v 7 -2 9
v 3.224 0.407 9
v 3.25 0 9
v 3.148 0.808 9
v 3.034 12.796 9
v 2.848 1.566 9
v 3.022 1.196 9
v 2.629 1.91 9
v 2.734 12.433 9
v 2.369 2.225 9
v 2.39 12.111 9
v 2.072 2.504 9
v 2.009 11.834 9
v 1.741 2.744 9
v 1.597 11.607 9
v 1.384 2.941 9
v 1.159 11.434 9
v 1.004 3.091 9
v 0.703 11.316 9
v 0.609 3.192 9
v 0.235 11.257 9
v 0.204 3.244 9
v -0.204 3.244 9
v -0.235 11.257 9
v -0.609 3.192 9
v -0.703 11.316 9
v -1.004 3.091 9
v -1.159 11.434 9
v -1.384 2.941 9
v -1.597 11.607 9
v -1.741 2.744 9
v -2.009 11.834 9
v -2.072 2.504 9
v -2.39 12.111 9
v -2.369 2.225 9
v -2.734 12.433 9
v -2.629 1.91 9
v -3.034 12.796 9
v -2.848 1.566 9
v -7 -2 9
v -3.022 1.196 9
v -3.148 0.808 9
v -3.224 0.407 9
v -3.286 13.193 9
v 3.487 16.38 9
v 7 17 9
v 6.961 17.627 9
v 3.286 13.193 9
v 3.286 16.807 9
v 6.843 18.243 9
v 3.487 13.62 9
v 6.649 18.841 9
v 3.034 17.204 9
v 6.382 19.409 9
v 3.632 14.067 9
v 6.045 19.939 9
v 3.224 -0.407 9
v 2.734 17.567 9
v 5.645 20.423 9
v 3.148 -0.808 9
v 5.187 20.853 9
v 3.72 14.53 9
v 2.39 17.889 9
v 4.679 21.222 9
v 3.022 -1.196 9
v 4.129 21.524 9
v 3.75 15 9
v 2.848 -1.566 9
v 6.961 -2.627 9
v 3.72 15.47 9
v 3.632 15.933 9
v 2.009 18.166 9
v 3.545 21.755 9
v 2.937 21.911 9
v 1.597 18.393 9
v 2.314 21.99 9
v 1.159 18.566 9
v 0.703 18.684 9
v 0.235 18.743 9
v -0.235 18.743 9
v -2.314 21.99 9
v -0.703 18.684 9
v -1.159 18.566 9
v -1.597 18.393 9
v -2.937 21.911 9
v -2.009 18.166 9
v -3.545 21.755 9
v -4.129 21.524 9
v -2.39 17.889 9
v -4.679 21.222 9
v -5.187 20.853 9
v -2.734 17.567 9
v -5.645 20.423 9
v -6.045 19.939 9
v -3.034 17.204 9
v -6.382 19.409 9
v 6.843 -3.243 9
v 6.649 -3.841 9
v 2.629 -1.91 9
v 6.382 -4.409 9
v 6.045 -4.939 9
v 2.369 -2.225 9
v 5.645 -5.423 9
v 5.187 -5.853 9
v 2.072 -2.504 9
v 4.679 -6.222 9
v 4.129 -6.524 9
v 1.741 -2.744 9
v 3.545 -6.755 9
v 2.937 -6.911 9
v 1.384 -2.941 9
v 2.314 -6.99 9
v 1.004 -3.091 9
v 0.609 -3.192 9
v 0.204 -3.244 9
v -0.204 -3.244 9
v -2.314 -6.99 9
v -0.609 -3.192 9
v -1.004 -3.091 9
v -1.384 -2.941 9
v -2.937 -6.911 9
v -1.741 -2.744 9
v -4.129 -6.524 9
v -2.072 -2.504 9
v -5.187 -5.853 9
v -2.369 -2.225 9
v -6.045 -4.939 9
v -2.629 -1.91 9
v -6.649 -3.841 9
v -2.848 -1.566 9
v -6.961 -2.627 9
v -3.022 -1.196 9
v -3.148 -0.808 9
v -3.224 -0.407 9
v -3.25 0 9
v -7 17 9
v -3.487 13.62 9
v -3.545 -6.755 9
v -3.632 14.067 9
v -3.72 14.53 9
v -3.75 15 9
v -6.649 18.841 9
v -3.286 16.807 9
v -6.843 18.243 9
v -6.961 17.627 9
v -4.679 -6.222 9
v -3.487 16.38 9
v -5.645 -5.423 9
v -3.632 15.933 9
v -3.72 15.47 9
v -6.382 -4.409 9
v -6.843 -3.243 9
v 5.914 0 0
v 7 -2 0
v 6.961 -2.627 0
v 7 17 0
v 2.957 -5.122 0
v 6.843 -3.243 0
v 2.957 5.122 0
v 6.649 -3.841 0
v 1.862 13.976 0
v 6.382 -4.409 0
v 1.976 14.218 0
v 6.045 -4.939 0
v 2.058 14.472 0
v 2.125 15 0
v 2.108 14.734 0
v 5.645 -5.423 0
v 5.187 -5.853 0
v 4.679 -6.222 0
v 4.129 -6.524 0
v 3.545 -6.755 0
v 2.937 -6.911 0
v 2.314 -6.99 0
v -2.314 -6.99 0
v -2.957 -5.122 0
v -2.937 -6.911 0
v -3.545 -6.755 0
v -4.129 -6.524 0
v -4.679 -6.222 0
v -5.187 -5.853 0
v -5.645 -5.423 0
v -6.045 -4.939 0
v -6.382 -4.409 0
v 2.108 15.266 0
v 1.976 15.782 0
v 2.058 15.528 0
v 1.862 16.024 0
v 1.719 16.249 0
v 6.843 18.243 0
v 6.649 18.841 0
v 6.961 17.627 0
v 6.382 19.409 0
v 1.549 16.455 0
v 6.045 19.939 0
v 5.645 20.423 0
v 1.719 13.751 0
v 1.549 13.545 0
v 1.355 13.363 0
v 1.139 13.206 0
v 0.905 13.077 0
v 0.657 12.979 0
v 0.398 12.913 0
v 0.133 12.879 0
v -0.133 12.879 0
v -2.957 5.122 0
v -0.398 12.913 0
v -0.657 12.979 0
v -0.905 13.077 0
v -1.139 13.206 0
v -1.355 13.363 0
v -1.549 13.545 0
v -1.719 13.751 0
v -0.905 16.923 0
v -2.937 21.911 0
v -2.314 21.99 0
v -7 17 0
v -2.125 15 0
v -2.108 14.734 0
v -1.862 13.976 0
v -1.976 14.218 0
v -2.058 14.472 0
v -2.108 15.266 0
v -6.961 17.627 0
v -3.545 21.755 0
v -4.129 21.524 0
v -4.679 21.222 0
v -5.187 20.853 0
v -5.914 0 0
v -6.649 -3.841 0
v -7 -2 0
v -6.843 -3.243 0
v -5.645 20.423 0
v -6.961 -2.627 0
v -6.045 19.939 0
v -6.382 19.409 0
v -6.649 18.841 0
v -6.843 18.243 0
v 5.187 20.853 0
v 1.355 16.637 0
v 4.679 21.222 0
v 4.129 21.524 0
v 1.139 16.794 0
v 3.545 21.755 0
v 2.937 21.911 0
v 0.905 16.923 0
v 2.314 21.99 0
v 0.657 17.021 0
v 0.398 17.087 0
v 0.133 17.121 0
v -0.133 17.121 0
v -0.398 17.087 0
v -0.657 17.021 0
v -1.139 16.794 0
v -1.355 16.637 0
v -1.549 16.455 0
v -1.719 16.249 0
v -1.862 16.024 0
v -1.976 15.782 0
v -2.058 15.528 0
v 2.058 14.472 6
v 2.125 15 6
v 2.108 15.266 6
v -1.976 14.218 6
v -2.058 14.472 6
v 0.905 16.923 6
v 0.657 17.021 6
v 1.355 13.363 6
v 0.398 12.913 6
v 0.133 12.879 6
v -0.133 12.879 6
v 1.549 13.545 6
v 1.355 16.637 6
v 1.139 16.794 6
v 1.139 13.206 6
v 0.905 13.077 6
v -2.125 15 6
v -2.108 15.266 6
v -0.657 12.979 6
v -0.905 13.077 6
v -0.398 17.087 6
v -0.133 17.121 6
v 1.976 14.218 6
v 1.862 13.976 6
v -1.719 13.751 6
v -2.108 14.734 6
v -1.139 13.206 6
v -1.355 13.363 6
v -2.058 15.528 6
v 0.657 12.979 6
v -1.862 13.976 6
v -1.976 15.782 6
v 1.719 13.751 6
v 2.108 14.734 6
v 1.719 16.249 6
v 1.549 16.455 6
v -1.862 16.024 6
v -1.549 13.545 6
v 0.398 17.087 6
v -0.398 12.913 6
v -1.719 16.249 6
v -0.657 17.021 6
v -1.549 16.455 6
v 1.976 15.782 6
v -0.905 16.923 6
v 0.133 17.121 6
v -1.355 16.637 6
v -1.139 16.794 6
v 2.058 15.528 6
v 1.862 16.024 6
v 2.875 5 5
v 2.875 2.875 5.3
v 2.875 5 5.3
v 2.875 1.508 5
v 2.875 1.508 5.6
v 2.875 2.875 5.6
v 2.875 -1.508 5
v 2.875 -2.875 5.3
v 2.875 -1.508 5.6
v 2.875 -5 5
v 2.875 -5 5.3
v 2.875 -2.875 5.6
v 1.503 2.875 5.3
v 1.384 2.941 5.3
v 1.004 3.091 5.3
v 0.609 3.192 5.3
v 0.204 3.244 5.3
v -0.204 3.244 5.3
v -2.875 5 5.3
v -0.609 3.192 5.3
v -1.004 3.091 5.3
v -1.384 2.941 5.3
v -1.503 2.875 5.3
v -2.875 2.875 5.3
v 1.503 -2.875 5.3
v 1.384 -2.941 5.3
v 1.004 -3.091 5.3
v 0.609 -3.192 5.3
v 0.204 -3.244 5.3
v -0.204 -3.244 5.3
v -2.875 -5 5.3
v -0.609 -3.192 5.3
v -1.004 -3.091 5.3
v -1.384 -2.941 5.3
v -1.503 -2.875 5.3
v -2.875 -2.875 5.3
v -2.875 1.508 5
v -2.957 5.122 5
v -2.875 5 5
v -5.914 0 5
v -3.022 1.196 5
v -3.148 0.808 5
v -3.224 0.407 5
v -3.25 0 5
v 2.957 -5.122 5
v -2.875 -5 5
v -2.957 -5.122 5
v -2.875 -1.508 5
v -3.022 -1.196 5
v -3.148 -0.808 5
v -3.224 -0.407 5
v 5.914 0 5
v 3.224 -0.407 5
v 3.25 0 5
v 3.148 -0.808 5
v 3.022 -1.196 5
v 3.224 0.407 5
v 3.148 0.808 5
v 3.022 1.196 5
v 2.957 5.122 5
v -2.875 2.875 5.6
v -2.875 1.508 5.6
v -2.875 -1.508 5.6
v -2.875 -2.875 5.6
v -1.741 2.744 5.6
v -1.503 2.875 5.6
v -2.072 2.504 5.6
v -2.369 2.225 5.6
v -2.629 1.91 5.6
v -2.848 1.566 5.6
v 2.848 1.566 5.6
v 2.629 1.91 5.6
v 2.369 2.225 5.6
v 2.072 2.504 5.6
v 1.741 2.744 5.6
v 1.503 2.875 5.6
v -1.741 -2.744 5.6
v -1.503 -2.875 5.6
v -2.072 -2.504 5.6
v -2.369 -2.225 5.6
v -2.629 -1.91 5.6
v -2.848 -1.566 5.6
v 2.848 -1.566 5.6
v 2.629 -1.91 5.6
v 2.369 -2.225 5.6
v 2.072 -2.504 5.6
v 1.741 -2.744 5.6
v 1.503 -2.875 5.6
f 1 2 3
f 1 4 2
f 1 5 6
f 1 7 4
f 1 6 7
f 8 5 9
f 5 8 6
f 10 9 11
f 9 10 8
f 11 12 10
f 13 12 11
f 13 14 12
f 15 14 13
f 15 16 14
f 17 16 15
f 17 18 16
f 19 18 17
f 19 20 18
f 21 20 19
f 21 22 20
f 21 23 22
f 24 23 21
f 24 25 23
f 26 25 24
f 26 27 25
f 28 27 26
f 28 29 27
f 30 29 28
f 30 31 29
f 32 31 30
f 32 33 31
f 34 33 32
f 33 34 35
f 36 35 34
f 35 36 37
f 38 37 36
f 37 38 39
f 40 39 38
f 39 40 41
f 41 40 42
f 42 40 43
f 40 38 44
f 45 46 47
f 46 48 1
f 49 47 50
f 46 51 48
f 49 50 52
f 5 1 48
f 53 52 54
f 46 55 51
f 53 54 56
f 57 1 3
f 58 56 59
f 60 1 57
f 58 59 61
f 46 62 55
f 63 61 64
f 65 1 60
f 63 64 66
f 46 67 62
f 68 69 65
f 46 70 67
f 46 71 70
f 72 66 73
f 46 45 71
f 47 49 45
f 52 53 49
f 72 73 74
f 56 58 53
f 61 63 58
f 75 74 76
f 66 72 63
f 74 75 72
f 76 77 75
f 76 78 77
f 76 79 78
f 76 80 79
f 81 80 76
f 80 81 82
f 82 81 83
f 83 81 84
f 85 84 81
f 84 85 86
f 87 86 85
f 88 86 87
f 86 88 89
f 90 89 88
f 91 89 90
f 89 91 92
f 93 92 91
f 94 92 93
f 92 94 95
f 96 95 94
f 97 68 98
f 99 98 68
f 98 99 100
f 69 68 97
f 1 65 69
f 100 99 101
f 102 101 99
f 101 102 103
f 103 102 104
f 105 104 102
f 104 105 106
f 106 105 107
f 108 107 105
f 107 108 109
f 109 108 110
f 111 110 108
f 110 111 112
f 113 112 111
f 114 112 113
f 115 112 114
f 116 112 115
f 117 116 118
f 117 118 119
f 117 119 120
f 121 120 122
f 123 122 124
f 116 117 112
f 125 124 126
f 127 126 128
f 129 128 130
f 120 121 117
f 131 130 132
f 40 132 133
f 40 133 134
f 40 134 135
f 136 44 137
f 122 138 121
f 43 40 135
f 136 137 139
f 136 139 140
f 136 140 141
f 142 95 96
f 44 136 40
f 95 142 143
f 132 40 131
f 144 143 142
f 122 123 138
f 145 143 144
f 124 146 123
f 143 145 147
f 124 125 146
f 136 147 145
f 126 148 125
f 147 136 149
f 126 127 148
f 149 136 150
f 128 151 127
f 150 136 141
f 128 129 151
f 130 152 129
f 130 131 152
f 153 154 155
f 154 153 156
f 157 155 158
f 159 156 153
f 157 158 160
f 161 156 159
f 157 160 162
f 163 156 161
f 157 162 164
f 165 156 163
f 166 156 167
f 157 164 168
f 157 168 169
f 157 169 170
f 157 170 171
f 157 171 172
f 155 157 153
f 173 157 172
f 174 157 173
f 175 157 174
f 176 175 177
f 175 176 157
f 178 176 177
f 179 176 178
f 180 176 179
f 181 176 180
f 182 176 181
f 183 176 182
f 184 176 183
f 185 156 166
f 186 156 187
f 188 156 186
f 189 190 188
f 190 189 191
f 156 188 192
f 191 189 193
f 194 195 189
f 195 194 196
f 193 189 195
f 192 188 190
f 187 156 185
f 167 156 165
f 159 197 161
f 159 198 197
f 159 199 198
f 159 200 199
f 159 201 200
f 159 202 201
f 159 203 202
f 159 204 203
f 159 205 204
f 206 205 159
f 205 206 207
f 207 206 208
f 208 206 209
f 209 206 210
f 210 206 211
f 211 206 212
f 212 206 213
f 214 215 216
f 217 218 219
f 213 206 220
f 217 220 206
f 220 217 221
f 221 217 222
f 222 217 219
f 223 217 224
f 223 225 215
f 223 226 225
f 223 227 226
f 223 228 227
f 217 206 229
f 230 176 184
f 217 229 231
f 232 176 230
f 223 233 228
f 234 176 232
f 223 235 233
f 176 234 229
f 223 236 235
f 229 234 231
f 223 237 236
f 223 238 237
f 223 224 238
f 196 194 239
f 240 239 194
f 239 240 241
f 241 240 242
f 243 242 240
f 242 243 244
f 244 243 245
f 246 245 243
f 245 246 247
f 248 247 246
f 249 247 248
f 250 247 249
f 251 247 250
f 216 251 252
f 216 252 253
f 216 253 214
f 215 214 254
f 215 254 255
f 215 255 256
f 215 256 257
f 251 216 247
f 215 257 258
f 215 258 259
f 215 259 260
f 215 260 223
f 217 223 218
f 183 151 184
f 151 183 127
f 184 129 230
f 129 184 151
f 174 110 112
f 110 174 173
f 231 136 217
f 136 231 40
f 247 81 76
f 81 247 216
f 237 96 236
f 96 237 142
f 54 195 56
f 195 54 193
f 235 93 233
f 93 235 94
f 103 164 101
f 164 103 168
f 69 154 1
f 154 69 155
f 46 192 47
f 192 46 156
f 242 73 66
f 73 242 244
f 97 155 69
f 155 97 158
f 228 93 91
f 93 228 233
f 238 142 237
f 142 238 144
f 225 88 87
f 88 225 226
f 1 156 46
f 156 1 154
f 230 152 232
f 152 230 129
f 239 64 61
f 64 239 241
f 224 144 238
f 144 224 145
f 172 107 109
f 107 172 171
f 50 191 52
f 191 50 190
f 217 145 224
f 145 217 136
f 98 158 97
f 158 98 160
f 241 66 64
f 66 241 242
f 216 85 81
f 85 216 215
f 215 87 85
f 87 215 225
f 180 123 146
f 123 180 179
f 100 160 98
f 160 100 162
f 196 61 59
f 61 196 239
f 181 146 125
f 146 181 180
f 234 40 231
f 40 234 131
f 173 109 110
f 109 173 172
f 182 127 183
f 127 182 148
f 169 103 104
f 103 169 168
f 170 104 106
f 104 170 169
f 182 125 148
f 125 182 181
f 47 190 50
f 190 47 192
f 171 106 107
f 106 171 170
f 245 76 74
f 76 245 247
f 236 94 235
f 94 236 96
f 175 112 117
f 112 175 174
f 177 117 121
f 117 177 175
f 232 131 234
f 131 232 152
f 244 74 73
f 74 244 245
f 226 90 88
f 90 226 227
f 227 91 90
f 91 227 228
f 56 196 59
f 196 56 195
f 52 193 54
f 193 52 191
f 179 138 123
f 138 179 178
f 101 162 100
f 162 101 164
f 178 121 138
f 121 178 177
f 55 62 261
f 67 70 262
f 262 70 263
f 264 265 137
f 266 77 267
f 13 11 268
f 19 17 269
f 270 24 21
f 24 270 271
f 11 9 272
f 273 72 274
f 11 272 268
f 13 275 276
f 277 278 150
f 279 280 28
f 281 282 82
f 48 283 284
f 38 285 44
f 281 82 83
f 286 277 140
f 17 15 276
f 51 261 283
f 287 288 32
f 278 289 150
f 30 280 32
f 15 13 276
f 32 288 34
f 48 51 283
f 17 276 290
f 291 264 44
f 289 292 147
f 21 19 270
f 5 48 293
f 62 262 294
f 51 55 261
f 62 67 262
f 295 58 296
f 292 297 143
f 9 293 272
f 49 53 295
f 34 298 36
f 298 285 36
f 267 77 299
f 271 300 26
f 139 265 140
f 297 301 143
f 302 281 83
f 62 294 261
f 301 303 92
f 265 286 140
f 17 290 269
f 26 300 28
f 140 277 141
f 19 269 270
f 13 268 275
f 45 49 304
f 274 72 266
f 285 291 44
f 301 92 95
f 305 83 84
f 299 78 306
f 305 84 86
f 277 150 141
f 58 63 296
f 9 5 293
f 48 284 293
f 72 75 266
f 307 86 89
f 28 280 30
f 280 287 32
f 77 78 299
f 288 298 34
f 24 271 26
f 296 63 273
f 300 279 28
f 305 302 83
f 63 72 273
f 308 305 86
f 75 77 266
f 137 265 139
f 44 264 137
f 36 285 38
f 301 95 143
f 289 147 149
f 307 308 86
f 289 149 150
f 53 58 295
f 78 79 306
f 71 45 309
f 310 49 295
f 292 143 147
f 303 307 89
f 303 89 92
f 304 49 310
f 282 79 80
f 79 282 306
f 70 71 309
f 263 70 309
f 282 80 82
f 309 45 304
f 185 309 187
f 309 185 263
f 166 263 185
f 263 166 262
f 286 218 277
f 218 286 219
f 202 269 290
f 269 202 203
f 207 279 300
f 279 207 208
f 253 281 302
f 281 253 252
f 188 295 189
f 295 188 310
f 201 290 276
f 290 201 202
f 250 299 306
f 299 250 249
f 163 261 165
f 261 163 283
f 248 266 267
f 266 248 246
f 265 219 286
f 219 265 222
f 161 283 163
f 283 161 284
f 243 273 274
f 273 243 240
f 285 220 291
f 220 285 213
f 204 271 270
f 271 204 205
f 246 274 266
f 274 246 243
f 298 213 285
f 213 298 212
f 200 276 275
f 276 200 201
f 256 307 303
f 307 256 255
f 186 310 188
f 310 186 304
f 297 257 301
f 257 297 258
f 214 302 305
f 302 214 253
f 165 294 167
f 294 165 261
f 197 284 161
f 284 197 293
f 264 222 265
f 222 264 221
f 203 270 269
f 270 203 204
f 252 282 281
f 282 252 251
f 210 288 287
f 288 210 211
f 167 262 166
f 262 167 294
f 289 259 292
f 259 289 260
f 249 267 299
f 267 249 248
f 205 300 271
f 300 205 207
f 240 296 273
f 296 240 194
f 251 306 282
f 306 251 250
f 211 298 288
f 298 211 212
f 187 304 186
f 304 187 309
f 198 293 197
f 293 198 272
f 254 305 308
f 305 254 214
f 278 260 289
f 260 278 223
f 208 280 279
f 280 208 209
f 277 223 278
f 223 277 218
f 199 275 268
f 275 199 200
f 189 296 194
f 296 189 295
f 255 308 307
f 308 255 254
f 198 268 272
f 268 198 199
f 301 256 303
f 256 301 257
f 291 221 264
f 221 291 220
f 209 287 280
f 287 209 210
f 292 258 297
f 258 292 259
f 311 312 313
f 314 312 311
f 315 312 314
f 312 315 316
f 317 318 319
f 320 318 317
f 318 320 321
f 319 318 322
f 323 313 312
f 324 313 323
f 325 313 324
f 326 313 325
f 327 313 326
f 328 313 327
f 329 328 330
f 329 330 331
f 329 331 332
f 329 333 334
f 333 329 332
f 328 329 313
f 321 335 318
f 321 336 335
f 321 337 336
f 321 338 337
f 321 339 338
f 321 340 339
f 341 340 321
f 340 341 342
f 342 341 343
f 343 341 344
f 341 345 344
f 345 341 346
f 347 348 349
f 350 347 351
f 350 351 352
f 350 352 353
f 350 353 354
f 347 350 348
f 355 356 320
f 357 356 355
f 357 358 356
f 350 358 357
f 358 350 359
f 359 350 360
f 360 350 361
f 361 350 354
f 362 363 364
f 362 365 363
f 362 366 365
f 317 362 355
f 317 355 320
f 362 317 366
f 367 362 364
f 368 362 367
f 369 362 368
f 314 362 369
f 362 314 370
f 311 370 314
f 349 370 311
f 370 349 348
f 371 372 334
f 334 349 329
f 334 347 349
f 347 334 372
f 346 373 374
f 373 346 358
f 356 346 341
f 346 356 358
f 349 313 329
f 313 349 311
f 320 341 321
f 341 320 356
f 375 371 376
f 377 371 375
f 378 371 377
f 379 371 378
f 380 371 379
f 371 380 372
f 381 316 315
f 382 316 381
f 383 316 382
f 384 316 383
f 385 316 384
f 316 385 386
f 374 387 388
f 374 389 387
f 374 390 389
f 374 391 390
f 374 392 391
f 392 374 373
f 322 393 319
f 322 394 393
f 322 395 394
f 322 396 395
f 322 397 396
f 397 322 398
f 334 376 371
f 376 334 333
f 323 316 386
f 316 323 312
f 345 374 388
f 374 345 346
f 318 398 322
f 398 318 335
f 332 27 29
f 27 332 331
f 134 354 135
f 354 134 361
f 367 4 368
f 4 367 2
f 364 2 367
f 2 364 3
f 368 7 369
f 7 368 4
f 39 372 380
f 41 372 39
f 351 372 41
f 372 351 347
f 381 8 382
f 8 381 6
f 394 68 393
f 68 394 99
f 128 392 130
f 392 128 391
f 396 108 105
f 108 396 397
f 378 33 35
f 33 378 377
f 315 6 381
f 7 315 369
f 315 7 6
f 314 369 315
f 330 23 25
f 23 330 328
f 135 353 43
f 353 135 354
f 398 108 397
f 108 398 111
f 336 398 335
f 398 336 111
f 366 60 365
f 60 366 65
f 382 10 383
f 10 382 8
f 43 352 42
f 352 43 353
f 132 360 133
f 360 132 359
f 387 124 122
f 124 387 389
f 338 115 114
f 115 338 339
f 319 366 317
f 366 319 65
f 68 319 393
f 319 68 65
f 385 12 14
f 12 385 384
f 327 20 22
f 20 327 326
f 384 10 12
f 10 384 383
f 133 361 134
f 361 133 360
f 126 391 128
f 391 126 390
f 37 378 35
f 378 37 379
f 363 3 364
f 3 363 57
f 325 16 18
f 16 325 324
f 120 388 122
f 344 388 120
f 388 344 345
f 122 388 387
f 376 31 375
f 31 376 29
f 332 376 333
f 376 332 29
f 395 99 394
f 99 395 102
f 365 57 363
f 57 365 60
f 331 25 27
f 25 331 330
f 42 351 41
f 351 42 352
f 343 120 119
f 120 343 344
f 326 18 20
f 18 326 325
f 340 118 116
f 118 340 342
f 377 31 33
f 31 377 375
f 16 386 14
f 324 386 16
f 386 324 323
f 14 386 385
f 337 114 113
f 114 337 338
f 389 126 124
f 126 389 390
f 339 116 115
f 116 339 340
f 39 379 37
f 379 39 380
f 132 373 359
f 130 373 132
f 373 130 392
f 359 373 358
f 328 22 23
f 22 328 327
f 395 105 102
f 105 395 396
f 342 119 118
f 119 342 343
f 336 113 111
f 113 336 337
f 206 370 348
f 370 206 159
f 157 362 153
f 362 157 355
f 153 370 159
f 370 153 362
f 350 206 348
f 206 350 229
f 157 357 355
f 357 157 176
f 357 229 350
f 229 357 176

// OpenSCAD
$fn = 50;


difference() {
	union() {
		cylinder(h = 9, r = 7.0000000000);
		translate(v = [0.0000000000, 7.5000000000, 0]) {
			hull() {
				translate(v = [-2.0000000000, 9.5000000000, 0]) {
					cylinder(h = 9, r = 5);
				}
				translate(v = [2.0000000000, 9.5000000000, 0]) {
					cylinder(h = 9, r = 5);
				}
				translate(v = [-2.0000000000, -9.5000000000, 0]) {
					cylinder(h = 9, r = 5);
				}
				translate(v = [2.0000000000, -9.5000000000, 0]) {
					cylinder(h = 9, r = 5);
				}
			}
		}
		translate(v = [0.0000000000, 7.5000000000, 0]) {
			hull() {
				translate(v = [-2.0000000000, 9.5000000000, 0]) {
					cylinder(h = 9, r = 5);
				}
				translate(v = [2.0000000000, 9.5000000000, 0]) {
					cylinder(h = 9, r = 5);
				}
				translate(v = [-2.0000000000, -9.5000000000, 0]) {
					cylinder(h = 9, r = 5);
				}
				translate(v = [2.0000000000, -9.5000000000, 0]) {
					cylinder(h = 9, r = 5);
				}
			}
		}
	}
	union() {
		translate(v = [0.0000000000, 15.0000000000, 9]) {
			rotate(a = [0, 0, 0]) {
				difference() {
					union() {
						#translate(v = [0, 0, -9.0000000000]) {
							cylinder(h = 9, r = 2.0000000000);
						}
						#translate(v = [0, 0, -3]) {
							cylinder(h = 3, r1 = 2.1250000000, r2 = 3.7500000000);
						}
						#translate(v = [0, 0, -9.0000000000]) {
							cylinder(h = 9, r = 2.1250000000);
						}
						#translate(v = [0, 0, -9.0000000000]) {
							cylinder(h = 9, r = 2.0000000000);
						}
					}
					union();
				}
			}
		}
		translate(v = [0.0000000000, 15.0000000000, 9]) {
			rotate(a = [0, 0, 0]) {
				difference() {
					union() {
						#translate(v = [0, 0, -9.0000000000]) {
							cylinder(h = 9, r = 2.0000000000);
						}
						#translate(v = [0, 0, -3]) {
							cylinder(h = 3, r1 = 2.1250000000, r2 = 3.7500000000);
						}
						#translate(v = [0, 0, -9.0000000000]) {
							cylinder(h = 9, r = 2.1250000000);
						}
						#translate(v = [0, 0, -9.0000000000]) {
							cylinder(h = 9, r = 2.0000000000);
						}
					}
					union();
				}
			}
		}
		translate(v = [0.0000000000, 0.0000000000, 0]) {
			rotate(a = [0, 0, 0]) {
				difference() {
					union() {
						#translate(v = [-2.8750000000, -5.0000000000, -0.3000000000]) {
							cube(size = [5.7500000000, 10, 0.3000000000]);
						}
						#translate(v = [-2.8750000000, -2.8750000000, -0.6000000000]) {
							cube(size = [5.7500000000, 5.7500000000, 0.3000000000]);
						}
						#translate(v = [-2.8750000000, -5.0000000000, 5]) {
							cube(size = [5.7500000000, 10, 0.3000000000]);
						}
						#translate(v = [-2.8750000000, -2.8750000000, 5.3000000000]) {
							cube(size = [5.7500000000, 5.7500000000, 0.3000000000]);
						}
						#translate(v = [0, 0, -100.0000000000]) {
							cylinder(h = 200, r = 3.2500000000);
						}
						#linear_extrude(height = 5) {
							polygon(points = [[5.9142500000, 0.0000000000], [2.9571250000, 5.1218907443], [-2.9571250000, 5.1218907443], [-5.9142500000, 0.0000000000], [-2.9571250000, -5.1218907443], [2.9571250000, -5.1218907443]]);
						}
						#translate(v = [-2.8750000000, -5.0000000000, -0.3000000000]) {
							cube(size = [5.7500000000, 10, 0.3000000000]);
						}
						#translate(v = [-2.8750000000, -2.8750000000, -0.6000000000]) {
							cube(size = [5.7500000000, 5.7500000000, 0.3000000000]);
						}
						#translate(v = [-2.8750000000, -5.0000000000, 5]) {
							cube(size = [5.7500000000, 10, 0.3000000000]);
						}
						#translate(v = [-2.8750000000, -2.8750000000, 5.3000000000]) {
							cube(size = [5.7500000000, 5.7500000000, 0.3000000000]);
						}
						#translate(v = [0, 0, -100.0000000000]) {
							cylinder(h = 200, r = 3.2500000000);
						}
						#translate(v = [-2.8750000000, -5.0000000000, -0.3000000000]) {
							cube(size = [5.7500000000, 10, 0.3000000000]);
						}
						#translate(v = [-2.8750000000, -2.8750000000, -0.6000000000]) {
							cube(size = [5.7500000000, 5.7500000000, 0.3000000000]);
						}
						#translate(v = [-2.8750000000, -5.0000000000, 5]) {
							cube(size = [5.7500000000, 10, 0.3000000000]);
						}
						#translate(v = [-2.8750000000, -2.8750000000, 5.3000000000]) {
							cube(size = [5.7500000000, 5.7500000000, 0.3000000000]);
						}
						#translate(v = [0, 0, -100.0000000000]) {
							cylinder(h = 200, r = 3.2500000000);
						}
					}
					union();
				}
			}
		}
		translate(v = [0, 0, -100]) {
			cylinder(h = 200, r = 3.2500000000);
		}
		translate(v = [0, 0, -100]) {
			cylinder(h = 200, r = 1.8000000000);
		}
	}
}
